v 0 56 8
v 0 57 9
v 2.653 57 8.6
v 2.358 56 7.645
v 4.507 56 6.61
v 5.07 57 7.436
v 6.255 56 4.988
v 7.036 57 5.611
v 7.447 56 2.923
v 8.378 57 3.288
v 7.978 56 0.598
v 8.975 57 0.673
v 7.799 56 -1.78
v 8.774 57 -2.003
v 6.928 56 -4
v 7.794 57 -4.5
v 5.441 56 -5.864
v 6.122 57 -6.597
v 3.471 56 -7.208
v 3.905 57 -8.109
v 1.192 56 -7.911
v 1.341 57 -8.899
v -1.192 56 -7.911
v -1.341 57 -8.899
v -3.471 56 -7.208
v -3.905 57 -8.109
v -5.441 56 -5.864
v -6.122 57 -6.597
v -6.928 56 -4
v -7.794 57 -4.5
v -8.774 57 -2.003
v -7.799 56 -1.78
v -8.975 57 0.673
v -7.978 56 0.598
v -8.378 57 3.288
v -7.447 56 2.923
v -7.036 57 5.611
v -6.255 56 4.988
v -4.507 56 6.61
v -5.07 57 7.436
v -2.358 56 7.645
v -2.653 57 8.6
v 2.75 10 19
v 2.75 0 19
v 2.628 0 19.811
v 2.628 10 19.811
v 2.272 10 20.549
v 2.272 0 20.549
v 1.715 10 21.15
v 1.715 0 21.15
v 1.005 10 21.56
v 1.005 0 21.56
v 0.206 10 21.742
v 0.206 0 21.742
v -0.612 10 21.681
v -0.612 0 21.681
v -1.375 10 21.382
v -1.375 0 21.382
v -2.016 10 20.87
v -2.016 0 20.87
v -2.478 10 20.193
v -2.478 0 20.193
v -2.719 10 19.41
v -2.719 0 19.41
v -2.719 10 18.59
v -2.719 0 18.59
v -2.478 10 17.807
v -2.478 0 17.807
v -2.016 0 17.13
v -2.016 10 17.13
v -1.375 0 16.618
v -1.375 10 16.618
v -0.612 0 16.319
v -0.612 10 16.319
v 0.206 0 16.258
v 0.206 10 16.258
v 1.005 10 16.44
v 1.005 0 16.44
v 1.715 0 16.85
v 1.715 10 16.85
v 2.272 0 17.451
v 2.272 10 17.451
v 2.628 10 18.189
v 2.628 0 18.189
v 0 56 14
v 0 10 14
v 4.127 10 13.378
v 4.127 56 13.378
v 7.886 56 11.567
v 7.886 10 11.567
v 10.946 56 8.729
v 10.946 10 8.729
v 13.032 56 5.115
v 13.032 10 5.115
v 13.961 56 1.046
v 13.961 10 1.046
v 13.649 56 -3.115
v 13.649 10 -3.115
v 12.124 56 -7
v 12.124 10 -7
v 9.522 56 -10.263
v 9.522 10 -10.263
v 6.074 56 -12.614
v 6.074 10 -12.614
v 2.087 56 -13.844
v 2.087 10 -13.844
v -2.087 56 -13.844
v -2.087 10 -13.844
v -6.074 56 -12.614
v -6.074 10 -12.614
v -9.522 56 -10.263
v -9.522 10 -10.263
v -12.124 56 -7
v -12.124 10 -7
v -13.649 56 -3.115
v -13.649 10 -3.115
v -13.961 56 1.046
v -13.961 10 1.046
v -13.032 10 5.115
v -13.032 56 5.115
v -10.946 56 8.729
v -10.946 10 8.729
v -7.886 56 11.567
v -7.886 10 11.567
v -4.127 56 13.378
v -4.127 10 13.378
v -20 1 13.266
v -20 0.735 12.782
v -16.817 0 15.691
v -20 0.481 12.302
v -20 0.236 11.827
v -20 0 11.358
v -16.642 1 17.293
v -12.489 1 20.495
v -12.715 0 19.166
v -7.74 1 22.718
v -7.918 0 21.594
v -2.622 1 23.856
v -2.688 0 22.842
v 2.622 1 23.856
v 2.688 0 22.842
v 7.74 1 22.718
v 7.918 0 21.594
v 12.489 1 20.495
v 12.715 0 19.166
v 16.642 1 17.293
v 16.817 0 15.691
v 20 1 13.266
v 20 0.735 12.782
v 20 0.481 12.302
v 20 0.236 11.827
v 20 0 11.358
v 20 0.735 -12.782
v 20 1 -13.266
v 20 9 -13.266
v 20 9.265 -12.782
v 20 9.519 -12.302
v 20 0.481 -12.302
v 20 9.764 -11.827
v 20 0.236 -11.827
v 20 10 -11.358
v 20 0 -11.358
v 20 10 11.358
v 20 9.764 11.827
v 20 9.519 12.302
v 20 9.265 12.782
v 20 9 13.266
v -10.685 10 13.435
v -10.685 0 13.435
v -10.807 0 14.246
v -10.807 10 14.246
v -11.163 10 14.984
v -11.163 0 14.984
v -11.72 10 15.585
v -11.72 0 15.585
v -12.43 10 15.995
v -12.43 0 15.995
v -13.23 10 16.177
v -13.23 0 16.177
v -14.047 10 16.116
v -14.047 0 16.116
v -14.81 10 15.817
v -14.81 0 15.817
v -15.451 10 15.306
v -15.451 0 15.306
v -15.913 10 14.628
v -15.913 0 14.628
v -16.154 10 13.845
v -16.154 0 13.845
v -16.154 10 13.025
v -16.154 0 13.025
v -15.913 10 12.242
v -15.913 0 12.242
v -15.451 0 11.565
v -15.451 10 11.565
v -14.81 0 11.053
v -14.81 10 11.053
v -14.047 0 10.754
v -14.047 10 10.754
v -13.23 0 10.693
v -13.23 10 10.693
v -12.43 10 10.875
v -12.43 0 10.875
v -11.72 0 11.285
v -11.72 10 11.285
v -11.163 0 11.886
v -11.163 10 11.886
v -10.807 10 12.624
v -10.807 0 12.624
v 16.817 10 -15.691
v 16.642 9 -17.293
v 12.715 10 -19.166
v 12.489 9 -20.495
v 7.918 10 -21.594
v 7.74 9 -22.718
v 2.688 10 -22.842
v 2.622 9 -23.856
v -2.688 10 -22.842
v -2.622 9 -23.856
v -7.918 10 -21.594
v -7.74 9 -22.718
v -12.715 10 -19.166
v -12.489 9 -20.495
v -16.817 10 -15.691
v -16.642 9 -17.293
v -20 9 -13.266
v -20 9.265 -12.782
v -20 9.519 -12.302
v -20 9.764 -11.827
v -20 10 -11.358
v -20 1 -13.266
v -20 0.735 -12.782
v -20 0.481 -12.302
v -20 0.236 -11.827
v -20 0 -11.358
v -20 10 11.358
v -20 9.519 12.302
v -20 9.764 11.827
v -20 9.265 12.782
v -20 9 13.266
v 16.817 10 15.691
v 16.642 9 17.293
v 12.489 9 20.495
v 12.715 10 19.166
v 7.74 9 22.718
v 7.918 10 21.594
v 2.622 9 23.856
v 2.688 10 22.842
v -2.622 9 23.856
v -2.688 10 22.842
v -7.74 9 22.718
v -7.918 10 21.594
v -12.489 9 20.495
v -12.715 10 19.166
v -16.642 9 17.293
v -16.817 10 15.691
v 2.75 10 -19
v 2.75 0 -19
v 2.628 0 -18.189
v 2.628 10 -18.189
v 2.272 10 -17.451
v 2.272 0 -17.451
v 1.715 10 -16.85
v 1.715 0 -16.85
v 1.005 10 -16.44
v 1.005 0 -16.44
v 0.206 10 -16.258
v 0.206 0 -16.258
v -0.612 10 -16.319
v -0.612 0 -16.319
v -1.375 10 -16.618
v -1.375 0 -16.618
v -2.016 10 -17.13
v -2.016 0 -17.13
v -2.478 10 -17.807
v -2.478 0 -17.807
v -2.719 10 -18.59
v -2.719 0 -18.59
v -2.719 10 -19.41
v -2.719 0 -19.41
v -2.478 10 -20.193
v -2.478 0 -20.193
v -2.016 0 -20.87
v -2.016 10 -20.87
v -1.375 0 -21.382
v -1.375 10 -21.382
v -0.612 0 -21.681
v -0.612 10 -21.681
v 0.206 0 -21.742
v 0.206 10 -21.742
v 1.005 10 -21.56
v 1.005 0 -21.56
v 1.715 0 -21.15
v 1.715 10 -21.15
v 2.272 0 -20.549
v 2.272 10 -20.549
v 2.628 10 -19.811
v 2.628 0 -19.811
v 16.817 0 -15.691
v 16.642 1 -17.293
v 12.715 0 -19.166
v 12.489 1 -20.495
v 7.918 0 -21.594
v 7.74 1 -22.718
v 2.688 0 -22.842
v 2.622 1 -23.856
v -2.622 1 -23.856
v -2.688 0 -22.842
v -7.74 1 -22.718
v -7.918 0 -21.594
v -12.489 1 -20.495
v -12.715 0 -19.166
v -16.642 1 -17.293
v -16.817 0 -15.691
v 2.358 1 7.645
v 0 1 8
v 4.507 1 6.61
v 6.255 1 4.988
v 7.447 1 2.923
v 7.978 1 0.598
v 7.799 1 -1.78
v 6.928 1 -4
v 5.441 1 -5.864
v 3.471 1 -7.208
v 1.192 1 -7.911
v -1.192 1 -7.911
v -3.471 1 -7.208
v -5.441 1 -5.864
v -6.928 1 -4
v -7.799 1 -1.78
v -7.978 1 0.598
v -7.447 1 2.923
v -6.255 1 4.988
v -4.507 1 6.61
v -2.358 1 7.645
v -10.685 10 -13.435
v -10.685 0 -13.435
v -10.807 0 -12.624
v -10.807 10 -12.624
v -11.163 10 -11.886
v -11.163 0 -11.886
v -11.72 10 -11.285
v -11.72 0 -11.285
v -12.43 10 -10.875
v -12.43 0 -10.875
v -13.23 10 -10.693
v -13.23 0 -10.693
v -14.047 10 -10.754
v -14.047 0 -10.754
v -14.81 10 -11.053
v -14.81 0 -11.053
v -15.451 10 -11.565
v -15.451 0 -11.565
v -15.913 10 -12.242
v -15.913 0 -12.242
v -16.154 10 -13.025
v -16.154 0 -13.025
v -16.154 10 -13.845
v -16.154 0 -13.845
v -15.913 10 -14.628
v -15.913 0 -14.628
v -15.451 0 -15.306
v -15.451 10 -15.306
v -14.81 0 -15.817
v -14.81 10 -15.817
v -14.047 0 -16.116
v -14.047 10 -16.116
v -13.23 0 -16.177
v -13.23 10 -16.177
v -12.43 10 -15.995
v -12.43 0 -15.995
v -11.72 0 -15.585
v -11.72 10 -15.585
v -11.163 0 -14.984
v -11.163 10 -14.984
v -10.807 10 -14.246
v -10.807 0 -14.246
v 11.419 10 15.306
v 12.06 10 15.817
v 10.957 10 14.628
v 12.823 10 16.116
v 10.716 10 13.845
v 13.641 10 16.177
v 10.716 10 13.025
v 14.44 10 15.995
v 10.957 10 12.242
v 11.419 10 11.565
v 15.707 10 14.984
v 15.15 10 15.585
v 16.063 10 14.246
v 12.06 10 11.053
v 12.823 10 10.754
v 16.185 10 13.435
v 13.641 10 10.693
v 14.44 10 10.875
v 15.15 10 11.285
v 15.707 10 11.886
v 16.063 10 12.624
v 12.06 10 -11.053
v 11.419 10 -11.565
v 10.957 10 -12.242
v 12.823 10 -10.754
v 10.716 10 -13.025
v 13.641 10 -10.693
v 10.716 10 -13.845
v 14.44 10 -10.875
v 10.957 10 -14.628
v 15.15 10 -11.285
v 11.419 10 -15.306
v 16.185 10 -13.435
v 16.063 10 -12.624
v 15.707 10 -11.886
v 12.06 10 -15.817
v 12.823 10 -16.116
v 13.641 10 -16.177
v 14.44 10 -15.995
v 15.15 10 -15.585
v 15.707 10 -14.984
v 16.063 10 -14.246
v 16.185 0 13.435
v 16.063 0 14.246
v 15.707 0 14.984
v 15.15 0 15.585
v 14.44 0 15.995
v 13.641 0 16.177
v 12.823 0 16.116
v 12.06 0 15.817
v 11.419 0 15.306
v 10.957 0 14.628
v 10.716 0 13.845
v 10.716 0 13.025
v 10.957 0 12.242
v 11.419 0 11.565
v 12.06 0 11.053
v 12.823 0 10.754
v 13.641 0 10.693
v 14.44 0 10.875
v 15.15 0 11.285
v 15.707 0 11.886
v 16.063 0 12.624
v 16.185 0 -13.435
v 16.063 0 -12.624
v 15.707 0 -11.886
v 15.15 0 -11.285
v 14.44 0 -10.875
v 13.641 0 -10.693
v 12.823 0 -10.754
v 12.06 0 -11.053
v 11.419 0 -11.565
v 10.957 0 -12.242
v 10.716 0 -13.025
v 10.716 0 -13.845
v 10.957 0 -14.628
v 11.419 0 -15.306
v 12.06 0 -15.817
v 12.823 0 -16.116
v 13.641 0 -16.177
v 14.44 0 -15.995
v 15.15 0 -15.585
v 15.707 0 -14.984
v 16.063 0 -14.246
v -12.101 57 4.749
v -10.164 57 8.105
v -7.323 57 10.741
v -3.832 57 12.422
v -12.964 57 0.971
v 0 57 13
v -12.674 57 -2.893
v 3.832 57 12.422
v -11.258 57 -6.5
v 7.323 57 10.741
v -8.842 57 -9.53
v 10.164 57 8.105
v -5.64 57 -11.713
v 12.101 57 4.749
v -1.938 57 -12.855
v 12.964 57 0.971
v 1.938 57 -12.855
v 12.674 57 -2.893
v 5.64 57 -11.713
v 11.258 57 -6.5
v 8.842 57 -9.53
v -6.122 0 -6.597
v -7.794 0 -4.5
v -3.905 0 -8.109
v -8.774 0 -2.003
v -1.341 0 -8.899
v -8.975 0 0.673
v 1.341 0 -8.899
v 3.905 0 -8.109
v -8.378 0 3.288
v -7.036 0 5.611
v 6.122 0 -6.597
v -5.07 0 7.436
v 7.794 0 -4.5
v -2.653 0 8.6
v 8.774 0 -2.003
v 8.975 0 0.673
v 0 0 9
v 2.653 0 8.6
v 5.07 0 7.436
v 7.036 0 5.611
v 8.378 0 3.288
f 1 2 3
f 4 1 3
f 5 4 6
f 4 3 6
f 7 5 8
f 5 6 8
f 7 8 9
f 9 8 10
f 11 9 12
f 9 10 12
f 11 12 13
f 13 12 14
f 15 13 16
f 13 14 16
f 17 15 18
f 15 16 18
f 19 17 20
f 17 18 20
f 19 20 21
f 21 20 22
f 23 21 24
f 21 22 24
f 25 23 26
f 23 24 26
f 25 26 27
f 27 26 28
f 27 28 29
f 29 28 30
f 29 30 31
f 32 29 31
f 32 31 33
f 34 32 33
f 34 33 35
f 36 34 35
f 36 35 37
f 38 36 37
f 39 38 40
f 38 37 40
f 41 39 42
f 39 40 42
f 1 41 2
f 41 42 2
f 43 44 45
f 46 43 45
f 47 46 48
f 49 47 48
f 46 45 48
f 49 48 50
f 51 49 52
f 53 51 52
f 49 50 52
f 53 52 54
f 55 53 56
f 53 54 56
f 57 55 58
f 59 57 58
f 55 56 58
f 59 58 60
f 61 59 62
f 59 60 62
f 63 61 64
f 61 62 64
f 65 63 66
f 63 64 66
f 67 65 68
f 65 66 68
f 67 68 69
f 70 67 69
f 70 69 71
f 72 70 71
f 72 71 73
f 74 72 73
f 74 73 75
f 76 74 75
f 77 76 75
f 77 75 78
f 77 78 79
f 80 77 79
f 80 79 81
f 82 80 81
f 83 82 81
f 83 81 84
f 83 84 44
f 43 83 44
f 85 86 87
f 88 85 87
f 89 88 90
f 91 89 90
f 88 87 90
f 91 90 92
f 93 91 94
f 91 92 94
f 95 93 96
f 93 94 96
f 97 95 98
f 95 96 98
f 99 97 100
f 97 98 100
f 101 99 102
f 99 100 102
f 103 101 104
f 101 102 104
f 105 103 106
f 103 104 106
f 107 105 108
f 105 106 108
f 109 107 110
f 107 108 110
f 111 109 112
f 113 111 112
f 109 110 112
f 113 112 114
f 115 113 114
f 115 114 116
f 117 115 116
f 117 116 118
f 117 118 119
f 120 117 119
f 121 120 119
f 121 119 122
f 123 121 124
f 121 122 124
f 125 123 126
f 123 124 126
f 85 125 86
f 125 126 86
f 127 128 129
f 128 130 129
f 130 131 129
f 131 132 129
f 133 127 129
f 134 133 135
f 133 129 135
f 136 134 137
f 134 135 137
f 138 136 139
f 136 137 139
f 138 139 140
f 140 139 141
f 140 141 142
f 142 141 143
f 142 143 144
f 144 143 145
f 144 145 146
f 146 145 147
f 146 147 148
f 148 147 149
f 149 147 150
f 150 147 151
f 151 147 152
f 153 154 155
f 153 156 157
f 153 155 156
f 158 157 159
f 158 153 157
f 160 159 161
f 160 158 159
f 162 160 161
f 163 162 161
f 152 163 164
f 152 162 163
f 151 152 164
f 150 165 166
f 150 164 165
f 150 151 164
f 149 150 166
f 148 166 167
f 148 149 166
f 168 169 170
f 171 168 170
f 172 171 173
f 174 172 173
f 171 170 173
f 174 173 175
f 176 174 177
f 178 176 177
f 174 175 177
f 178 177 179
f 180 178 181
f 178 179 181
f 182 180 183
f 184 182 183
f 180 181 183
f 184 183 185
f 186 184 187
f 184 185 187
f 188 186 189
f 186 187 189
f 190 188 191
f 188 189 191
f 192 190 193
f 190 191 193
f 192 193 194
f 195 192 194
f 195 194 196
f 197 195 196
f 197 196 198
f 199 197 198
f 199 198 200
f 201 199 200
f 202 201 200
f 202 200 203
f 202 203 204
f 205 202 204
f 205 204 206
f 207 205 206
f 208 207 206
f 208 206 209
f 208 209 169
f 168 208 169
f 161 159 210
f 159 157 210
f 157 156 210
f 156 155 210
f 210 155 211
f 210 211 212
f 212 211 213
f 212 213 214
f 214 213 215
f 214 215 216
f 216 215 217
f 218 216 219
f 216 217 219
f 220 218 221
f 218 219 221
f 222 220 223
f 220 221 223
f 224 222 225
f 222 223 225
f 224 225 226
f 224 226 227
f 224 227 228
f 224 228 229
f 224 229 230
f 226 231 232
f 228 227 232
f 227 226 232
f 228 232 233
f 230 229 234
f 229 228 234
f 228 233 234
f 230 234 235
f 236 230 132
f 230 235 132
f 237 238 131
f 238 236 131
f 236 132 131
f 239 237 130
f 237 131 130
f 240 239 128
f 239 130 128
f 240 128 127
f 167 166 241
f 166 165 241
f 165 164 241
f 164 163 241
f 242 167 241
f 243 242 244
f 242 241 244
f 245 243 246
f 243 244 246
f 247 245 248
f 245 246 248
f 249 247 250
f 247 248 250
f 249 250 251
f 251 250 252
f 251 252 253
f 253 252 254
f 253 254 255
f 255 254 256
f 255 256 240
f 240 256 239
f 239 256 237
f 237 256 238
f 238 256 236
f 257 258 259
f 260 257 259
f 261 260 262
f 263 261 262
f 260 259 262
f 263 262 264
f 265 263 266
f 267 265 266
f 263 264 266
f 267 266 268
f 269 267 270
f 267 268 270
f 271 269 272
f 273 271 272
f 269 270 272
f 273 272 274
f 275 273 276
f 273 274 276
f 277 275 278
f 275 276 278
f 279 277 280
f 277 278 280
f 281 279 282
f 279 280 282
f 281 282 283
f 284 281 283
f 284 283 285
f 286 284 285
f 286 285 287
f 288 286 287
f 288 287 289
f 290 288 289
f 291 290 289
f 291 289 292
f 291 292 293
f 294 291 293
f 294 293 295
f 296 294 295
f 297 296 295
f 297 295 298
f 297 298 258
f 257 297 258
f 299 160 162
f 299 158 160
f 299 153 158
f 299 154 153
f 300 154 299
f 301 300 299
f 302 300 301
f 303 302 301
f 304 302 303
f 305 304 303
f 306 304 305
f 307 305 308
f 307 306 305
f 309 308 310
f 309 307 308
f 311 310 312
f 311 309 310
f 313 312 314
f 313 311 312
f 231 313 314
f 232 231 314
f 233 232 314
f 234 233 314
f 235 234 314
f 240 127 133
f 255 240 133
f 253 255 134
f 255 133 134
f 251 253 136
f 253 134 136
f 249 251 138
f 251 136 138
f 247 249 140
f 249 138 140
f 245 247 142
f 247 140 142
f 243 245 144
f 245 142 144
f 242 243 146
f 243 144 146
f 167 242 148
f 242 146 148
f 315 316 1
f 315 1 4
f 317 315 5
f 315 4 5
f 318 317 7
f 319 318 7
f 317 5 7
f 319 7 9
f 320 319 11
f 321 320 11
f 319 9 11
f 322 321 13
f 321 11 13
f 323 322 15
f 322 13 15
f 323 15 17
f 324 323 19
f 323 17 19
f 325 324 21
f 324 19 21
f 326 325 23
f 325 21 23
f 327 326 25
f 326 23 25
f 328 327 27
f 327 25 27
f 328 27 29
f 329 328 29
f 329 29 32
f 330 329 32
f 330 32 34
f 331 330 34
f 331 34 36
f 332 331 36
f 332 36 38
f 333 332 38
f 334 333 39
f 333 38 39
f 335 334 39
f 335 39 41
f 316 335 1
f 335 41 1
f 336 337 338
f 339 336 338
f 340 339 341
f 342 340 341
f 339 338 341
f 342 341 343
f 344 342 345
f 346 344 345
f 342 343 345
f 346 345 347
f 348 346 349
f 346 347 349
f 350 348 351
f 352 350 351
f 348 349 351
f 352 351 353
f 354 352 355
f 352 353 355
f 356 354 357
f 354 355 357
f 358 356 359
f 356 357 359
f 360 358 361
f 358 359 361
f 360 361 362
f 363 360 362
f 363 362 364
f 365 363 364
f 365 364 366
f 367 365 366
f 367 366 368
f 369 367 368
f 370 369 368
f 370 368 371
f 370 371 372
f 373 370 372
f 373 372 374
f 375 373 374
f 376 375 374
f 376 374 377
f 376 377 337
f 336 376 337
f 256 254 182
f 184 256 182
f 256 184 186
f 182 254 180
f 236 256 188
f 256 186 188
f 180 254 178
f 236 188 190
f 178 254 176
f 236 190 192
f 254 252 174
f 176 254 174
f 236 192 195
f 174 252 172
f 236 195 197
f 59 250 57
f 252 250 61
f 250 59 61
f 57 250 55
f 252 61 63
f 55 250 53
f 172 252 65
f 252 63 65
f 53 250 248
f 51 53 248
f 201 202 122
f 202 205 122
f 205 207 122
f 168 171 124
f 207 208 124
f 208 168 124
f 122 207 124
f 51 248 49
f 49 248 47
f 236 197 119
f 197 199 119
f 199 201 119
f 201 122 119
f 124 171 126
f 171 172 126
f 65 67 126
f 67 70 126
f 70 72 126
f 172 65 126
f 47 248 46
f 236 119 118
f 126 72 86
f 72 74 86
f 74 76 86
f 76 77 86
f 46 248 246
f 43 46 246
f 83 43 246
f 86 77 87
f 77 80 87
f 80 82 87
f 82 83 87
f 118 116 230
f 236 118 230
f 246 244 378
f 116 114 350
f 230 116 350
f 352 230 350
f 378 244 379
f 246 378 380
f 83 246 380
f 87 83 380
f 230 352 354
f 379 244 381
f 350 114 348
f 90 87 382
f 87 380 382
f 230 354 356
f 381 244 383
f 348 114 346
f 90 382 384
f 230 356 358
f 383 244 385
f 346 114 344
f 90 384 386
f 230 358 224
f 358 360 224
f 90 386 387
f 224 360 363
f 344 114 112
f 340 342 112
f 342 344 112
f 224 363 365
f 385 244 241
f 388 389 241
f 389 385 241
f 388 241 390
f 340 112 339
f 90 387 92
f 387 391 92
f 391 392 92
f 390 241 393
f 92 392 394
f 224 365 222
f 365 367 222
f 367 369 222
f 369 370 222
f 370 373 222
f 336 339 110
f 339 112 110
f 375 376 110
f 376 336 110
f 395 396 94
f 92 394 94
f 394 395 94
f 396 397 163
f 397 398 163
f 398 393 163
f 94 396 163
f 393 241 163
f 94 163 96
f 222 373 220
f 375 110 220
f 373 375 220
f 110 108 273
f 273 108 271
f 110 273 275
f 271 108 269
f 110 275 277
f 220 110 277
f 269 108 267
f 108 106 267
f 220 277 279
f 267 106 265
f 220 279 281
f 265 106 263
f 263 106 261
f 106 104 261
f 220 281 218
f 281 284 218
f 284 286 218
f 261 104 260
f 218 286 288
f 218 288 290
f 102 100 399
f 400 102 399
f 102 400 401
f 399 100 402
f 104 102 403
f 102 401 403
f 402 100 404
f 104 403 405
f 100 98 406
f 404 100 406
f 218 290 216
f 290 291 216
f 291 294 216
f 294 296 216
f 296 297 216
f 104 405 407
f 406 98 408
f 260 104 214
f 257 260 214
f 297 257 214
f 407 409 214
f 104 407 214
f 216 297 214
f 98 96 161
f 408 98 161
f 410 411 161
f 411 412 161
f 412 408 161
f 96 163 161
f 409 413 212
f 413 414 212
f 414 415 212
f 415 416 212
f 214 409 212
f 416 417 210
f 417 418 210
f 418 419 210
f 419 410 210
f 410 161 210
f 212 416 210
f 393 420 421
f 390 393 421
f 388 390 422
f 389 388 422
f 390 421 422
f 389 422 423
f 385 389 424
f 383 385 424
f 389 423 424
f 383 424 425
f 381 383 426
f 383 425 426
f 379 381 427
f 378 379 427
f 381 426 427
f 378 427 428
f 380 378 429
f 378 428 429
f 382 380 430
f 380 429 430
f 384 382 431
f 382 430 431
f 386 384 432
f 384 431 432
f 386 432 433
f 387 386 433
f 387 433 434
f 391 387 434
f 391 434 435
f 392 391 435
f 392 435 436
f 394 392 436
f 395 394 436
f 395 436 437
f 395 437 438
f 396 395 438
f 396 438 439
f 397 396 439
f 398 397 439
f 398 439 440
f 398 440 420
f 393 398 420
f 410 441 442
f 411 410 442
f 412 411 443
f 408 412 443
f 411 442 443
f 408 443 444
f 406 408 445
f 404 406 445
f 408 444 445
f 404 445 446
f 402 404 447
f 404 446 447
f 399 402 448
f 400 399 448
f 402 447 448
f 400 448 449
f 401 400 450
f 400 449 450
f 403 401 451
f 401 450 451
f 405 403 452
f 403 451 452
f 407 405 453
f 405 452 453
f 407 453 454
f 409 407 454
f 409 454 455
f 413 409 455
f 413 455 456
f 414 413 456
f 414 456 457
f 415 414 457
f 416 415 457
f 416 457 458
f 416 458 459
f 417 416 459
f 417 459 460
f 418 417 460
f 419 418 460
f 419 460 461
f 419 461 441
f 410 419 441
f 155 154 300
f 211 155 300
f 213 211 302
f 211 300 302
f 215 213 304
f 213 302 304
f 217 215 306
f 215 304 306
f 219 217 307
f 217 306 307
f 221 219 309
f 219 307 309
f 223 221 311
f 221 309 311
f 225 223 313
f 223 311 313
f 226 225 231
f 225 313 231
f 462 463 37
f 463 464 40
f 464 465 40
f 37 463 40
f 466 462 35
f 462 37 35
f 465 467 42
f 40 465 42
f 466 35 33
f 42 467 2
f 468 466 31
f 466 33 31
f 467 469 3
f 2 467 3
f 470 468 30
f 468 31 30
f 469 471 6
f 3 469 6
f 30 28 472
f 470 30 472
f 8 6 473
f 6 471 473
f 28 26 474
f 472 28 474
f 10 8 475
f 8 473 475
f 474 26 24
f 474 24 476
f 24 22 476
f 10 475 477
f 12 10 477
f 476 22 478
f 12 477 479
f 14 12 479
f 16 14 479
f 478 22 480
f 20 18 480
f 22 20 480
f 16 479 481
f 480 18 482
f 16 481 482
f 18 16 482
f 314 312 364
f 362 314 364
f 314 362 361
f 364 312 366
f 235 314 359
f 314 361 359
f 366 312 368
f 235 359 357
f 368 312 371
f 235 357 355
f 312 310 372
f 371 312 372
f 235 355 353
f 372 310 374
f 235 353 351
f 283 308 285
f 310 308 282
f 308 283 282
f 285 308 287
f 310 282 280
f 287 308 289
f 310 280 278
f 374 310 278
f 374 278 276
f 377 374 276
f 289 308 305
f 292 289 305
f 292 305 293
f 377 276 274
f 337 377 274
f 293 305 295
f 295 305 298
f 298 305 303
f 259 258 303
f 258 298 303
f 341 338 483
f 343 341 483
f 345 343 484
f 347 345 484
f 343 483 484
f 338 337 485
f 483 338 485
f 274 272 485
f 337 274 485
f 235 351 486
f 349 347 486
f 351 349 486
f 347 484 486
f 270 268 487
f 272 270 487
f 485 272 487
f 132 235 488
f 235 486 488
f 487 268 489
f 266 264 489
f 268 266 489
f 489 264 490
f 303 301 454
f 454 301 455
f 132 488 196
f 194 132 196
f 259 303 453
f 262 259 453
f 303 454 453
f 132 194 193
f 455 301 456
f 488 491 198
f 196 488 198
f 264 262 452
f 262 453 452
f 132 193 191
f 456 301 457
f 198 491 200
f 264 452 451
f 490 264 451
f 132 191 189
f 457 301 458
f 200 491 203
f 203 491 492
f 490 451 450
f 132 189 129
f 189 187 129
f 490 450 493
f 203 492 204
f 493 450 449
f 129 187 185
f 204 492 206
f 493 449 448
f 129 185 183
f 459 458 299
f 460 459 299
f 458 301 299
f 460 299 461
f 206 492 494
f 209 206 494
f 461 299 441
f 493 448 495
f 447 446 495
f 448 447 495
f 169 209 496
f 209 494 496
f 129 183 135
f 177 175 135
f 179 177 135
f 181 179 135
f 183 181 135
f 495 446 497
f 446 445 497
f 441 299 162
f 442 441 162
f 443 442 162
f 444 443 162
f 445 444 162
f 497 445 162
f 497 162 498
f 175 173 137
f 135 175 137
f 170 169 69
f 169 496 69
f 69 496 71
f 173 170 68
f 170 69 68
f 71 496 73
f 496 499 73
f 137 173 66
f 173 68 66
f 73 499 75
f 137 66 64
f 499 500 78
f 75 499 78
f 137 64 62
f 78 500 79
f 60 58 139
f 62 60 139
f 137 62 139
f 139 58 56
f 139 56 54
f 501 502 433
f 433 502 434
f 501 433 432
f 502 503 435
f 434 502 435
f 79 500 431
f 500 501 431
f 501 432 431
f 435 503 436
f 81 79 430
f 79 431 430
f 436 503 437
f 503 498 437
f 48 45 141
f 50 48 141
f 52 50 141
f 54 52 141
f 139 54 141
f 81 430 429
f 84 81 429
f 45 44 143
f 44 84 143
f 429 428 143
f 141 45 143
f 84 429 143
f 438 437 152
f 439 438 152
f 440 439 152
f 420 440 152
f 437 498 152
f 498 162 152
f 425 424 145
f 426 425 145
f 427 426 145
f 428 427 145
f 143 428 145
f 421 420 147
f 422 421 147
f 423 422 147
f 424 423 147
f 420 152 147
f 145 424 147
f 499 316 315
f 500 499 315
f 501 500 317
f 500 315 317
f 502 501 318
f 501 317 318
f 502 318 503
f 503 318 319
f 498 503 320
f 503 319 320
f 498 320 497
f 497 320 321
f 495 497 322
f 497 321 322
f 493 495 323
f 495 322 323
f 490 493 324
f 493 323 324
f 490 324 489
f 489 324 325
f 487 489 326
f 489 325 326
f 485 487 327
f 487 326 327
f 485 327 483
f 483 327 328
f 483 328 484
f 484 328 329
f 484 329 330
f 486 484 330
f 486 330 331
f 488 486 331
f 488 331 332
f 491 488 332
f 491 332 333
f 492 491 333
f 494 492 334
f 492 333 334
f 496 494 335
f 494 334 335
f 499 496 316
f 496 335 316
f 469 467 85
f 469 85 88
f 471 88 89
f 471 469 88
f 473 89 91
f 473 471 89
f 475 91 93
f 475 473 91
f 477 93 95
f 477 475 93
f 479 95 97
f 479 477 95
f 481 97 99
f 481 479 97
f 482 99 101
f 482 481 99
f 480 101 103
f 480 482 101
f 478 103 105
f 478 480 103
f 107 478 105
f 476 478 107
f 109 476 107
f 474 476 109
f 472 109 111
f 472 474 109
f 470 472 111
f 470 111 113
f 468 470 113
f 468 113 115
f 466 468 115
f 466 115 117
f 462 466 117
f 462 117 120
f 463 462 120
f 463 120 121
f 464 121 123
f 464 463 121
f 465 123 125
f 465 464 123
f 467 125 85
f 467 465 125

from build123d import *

# Parameters (mm, degrees)
F2_W     = 73.8781243563
F2_H     = 160.1297496091
F2_W_2   = 40
F2_H_2   = 126.2516252528
F3_DEPTH = 25
F4_R     = 2.75
F5_DEPTH = 25
F6_SIZE  = 1


with BuildPart() as f1:
    # F0 (on Right) → F1 (revolve)
    with BuildSketch(Plane.YZ):
        Polygon((10, 24), (0, 24), (0, 8), (57, 8), (57, 14), (10, 14), align=None)
    revolve(axis=Axis((0, 17.6531788457, 0), (0, 1, 0)))

    # F2 (on face) → F3 (cut)
    with BuildSketch(Plane.XZ):
        Rectangle(F2_W, F2_H)
        Rectangle(F2_W_2, F2_H_2, mode=Mode.SUBTRACT)
    extrude(amount=-F3_DEPTH, mode=Mode.SUBTRACT)

    # F4 (on face) → F5 (cut)
    with BuildSketch(Plane.XZ):
        with Locations((0, 19)):
            Circle(F4_R)
        with Locations((-13.4350288425, 13.4350288425)):
            Circle(F4_R)
        with Locations((-13.4350288425, -13.4350288425)):
            Circle(F4_R)
        with Locations((0, -19)):
            Circle(F4_R)
        with Locations((13.4350288425, -13.4350288425)):
            Circle(F4_R)
        with Locations((13.4350288425, 13.4350288425)):
            Circle(F4_R)
    extrude(amount=-F5_DEPTH, mode=Mode.SUBTRACT)

    # F6
    f6_edges = [f1.edges().sort_by_distance(p)[0] for p in [
        (0, 0, -8),
        (0, 57, -8),
        (0, 28.5, 8),
        (0, 57, -14),
        (0, 0, 24),
        (0, 0, -24),
        (0, 10, 24),
        (0, 10, -24),
    ]]
    chamfer(f6_edges, length=F6_SIZE)


solid = f1.part
